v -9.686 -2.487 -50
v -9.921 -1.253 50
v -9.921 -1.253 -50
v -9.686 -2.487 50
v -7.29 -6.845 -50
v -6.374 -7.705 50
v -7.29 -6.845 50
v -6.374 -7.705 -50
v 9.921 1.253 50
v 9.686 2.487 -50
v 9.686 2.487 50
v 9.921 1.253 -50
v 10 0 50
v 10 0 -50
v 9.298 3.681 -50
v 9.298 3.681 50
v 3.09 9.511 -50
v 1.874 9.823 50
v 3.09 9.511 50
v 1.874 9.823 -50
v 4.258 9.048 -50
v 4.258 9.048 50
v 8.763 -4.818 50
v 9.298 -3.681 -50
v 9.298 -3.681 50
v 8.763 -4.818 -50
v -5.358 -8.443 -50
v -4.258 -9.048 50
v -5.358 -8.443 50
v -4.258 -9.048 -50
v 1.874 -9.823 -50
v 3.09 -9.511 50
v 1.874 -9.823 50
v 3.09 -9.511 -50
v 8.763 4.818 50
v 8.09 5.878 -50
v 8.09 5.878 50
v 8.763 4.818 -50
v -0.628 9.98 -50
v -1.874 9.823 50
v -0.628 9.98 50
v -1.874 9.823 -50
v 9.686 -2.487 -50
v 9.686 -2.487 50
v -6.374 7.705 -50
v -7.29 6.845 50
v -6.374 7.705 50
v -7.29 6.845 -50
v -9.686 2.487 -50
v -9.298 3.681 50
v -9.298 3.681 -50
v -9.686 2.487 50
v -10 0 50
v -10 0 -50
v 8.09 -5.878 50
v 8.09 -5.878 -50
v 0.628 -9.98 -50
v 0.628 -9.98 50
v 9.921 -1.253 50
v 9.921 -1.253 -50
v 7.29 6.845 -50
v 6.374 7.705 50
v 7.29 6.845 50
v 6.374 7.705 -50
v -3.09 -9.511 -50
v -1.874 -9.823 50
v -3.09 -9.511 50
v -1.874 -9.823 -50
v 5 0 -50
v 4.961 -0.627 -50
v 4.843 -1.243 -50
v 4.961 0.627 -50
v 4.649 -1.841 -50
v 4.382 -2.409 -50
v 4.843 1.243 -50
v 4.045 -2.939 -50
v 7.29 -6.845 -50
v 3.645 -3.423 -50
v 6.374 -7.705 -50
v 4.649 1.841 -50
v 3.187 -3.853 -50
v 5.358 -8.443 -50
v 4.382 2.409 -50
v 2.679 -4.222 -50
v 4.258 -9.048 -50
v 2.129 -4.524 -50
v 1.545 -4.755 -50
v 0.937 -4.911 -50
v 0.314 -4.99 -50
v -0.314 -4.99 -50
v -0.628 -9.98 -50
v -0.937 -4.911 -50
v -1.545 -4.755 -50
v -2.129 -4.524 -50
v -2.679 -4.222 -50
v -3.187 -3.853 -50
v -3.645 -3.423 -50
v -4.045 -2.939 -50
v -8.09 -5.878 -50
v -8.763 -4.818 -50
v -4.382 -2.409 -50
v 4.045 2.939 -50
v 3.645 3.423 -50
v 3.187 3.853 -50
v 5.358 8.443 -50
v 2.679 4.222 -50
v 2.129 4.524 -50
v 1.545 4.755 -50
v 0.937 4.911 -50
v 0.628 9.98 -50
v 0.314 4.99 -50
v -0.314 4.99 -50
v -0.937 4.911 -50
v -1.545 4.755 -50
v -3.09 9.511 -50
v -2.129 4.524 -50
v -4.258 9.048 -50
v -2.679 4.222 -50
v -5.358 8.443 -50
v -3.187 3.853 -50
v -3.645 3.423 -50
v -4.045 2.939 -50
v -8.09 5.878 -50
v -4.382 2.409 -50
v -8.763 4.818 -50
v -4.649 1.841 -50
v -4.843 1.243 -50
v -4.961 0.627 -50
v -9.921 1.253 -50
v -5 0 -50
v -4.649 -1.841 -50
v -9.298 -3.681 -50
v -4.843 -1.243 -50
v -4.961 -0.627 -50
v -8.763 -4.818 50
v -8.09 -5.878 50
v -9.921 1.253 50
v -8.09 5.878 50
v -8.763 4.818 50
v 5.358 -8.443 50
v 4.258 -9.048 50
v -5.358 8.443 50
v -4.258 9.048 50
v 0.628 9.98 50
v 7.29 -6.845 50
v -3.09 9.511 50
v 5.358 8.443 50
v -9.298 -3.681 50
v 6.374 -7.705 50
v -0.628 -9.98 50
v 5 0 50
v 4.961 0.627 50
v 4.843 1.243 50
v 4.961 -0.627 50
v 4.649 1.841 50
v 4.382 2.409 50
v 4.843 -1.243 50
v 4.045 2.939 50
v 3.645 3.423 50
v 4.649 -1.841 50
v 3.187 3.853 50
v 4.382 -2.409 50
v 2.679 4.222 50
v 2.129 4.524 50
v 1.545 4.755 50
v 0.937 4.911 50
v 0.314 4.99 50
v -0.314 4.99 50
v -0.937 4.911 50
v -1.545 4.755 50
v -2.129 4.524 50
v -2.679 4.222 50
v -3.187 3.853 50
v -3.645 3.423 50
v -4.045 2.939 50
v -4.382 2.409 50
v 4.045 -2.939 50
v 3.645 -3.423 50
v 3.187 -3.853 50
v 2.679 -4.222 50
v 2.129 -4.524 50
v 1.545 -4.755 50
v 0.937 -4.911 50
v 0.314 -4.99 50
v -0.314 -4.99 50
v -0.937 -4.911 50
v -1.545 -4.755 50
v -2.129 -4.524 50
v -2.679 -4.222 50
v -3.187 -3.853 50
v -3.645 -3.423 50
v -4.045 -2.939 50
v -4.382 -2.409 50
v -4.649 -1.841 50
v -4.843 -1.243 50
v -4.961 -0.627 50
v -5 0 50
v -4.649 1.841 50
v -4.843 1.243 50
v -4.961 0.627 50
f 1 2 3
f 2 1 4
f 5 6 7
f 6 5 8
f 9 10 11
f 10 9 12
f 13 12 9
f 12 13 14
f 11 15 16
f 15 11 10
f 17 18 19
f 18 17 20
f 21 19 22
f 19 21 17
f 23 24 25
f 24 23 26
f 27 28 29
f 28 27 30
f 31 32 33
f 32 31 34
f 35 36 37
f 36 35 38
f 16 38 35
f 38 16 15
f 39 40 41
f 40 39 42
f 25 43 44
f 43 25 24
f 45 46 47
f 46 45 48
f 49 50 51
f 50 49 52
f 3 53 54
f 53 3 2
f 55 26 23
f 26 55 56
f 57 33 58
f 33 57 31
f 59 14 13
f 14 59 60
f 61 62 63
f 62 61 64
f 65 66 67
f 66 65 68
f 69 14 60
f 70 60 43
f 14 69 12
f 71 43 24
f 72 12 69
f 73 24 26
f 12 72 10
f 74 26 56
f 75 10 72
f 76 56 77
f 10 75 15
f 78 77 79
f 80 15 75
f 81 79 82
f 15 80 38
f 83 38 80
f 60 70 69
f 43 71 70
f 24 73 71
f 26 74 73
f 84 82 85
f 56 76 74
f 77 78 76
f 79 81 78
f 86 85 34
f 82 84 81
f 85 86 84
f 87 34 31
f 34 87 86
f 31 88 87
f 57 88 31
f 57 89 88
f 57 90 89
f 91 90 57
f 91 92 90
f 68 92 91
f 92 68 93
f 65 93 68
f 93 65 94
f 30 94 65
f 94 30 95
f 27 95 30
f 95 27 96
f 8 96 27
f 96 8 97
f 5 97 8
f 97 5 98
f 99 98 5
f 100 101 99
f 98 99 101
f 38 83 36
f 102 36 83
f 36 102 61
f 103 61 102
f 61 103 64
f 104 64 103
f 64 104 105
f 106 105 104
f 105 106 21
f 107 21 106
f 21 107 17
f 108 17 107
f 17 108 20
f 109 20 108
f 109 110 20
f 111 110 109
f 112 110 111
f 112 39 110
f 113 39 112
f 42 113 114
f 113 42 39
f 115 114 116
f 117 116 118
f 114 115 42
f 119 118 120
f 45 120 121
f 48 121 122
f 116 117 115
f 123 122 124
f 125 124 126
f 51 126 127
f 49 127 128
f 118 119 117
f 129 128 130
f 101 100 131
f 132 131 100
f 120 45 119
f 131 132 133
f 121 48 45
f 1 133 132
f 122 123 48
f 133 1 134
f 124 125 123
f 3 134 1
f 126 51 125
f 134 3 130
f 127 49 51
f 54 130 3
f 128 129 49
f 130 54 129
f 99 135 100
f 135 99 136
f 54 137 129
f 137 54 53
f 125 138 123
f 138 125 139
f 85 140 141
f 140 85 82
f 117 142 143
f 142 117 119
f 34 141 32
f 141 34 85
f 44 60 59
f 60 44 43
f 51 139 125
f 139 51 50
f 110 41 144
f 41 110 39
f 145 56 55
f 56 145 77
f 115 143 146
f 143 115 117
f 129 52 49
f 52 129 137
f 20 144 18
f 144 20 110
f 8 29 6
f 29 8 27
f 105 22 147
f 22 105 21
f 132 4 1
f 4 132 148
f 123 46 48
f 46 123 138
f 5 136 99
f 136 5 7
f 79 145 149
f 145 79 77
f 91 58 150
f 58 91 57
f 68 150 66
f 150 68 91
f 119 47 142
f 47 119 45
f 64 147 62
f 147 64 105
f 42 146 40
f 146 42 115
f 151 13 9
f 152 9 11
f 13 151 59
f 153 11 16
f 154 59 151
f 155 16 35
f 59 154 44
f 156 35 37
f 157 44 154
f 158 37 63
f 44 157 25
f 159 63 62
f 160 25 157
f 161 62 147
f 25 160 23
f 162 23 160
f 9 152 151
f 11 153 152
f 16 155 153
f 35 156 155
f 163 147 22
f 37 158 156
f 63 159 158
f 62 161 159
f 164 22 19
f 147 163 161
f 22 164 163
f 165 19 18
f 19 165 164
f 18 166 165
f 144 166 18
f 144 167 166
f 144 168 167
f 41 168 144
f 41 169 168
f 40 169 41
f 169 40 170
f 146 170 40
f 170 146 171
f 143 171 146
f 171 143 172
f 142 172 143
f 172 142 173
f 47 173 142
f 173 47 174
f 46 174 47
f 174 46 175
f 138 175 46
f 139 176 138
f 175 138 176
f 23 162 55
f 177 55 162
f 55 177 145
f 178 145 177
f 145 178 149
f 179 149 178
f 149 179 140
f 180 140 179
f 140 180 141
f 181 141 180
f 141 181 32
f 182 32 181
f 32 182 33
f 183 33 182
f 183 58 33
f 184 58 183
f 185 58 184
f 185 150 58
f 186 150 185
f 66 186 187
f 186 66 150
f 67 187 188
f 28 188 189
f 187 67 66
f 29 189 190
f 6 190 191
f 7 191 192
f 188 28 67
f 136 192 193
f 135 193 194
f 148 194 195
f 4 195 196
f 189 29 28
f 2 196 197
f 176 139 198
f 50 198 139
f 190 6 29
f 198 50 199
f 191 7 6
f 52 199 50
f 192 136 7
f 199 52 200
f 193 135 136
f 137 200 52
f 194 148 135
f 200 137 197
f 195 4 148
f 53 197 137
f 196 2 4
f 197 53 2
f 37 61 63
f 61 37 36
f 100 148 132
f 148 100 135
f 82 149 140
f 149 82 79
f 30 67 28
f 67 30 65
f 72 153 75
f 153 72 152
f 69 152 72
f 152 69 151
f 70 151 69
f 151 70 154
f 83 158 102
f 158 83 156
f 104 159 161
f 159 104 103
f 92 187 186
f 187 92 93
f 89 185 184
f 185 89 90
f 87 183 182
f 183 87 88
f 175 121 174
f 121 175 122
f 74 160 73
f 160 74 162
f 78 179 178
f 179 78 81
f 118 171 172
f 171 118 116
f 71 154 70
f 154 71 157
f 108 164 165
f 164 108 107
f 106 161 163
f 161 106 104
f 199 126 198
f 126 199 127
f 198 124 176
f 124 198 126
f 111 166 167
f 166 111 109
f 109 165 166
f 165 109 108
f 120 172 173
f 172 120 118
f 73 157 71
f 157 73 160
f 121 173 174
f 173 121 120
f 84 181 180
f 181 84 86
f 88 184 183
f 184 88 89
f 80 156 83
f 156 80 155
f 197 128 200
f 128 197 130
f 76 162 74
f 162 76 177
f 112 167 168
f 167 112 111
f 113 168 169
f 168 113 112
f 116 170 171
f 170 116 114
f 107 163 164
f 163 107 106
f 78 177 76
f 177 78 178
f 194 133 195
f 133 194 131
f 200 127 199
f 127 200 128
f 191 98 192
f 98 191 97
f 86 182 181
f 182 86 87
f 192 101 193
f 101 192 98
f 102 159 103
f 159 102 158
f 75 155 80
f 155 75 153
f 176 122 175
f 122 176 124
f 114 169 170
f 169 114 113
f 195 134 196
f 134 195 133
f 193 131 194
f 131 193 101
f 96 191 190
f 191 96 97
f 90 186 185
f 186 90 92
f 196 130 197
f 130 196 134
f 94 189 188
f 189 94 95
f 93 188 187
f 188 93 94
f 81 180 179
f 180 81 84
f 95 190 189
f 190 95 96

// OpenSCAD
$fn = 50;


difference() {
	union() {
		translate(v = [0, 0, -50.0000000000]) {
			cylinder(h = 100, r = 10.0000000000);
		}
	}
	union() {
		translate(v = [0, 0, -100.0000000000]) {
			cylinder(h = 200, r = 5.0000000000);
		}
	}
}
